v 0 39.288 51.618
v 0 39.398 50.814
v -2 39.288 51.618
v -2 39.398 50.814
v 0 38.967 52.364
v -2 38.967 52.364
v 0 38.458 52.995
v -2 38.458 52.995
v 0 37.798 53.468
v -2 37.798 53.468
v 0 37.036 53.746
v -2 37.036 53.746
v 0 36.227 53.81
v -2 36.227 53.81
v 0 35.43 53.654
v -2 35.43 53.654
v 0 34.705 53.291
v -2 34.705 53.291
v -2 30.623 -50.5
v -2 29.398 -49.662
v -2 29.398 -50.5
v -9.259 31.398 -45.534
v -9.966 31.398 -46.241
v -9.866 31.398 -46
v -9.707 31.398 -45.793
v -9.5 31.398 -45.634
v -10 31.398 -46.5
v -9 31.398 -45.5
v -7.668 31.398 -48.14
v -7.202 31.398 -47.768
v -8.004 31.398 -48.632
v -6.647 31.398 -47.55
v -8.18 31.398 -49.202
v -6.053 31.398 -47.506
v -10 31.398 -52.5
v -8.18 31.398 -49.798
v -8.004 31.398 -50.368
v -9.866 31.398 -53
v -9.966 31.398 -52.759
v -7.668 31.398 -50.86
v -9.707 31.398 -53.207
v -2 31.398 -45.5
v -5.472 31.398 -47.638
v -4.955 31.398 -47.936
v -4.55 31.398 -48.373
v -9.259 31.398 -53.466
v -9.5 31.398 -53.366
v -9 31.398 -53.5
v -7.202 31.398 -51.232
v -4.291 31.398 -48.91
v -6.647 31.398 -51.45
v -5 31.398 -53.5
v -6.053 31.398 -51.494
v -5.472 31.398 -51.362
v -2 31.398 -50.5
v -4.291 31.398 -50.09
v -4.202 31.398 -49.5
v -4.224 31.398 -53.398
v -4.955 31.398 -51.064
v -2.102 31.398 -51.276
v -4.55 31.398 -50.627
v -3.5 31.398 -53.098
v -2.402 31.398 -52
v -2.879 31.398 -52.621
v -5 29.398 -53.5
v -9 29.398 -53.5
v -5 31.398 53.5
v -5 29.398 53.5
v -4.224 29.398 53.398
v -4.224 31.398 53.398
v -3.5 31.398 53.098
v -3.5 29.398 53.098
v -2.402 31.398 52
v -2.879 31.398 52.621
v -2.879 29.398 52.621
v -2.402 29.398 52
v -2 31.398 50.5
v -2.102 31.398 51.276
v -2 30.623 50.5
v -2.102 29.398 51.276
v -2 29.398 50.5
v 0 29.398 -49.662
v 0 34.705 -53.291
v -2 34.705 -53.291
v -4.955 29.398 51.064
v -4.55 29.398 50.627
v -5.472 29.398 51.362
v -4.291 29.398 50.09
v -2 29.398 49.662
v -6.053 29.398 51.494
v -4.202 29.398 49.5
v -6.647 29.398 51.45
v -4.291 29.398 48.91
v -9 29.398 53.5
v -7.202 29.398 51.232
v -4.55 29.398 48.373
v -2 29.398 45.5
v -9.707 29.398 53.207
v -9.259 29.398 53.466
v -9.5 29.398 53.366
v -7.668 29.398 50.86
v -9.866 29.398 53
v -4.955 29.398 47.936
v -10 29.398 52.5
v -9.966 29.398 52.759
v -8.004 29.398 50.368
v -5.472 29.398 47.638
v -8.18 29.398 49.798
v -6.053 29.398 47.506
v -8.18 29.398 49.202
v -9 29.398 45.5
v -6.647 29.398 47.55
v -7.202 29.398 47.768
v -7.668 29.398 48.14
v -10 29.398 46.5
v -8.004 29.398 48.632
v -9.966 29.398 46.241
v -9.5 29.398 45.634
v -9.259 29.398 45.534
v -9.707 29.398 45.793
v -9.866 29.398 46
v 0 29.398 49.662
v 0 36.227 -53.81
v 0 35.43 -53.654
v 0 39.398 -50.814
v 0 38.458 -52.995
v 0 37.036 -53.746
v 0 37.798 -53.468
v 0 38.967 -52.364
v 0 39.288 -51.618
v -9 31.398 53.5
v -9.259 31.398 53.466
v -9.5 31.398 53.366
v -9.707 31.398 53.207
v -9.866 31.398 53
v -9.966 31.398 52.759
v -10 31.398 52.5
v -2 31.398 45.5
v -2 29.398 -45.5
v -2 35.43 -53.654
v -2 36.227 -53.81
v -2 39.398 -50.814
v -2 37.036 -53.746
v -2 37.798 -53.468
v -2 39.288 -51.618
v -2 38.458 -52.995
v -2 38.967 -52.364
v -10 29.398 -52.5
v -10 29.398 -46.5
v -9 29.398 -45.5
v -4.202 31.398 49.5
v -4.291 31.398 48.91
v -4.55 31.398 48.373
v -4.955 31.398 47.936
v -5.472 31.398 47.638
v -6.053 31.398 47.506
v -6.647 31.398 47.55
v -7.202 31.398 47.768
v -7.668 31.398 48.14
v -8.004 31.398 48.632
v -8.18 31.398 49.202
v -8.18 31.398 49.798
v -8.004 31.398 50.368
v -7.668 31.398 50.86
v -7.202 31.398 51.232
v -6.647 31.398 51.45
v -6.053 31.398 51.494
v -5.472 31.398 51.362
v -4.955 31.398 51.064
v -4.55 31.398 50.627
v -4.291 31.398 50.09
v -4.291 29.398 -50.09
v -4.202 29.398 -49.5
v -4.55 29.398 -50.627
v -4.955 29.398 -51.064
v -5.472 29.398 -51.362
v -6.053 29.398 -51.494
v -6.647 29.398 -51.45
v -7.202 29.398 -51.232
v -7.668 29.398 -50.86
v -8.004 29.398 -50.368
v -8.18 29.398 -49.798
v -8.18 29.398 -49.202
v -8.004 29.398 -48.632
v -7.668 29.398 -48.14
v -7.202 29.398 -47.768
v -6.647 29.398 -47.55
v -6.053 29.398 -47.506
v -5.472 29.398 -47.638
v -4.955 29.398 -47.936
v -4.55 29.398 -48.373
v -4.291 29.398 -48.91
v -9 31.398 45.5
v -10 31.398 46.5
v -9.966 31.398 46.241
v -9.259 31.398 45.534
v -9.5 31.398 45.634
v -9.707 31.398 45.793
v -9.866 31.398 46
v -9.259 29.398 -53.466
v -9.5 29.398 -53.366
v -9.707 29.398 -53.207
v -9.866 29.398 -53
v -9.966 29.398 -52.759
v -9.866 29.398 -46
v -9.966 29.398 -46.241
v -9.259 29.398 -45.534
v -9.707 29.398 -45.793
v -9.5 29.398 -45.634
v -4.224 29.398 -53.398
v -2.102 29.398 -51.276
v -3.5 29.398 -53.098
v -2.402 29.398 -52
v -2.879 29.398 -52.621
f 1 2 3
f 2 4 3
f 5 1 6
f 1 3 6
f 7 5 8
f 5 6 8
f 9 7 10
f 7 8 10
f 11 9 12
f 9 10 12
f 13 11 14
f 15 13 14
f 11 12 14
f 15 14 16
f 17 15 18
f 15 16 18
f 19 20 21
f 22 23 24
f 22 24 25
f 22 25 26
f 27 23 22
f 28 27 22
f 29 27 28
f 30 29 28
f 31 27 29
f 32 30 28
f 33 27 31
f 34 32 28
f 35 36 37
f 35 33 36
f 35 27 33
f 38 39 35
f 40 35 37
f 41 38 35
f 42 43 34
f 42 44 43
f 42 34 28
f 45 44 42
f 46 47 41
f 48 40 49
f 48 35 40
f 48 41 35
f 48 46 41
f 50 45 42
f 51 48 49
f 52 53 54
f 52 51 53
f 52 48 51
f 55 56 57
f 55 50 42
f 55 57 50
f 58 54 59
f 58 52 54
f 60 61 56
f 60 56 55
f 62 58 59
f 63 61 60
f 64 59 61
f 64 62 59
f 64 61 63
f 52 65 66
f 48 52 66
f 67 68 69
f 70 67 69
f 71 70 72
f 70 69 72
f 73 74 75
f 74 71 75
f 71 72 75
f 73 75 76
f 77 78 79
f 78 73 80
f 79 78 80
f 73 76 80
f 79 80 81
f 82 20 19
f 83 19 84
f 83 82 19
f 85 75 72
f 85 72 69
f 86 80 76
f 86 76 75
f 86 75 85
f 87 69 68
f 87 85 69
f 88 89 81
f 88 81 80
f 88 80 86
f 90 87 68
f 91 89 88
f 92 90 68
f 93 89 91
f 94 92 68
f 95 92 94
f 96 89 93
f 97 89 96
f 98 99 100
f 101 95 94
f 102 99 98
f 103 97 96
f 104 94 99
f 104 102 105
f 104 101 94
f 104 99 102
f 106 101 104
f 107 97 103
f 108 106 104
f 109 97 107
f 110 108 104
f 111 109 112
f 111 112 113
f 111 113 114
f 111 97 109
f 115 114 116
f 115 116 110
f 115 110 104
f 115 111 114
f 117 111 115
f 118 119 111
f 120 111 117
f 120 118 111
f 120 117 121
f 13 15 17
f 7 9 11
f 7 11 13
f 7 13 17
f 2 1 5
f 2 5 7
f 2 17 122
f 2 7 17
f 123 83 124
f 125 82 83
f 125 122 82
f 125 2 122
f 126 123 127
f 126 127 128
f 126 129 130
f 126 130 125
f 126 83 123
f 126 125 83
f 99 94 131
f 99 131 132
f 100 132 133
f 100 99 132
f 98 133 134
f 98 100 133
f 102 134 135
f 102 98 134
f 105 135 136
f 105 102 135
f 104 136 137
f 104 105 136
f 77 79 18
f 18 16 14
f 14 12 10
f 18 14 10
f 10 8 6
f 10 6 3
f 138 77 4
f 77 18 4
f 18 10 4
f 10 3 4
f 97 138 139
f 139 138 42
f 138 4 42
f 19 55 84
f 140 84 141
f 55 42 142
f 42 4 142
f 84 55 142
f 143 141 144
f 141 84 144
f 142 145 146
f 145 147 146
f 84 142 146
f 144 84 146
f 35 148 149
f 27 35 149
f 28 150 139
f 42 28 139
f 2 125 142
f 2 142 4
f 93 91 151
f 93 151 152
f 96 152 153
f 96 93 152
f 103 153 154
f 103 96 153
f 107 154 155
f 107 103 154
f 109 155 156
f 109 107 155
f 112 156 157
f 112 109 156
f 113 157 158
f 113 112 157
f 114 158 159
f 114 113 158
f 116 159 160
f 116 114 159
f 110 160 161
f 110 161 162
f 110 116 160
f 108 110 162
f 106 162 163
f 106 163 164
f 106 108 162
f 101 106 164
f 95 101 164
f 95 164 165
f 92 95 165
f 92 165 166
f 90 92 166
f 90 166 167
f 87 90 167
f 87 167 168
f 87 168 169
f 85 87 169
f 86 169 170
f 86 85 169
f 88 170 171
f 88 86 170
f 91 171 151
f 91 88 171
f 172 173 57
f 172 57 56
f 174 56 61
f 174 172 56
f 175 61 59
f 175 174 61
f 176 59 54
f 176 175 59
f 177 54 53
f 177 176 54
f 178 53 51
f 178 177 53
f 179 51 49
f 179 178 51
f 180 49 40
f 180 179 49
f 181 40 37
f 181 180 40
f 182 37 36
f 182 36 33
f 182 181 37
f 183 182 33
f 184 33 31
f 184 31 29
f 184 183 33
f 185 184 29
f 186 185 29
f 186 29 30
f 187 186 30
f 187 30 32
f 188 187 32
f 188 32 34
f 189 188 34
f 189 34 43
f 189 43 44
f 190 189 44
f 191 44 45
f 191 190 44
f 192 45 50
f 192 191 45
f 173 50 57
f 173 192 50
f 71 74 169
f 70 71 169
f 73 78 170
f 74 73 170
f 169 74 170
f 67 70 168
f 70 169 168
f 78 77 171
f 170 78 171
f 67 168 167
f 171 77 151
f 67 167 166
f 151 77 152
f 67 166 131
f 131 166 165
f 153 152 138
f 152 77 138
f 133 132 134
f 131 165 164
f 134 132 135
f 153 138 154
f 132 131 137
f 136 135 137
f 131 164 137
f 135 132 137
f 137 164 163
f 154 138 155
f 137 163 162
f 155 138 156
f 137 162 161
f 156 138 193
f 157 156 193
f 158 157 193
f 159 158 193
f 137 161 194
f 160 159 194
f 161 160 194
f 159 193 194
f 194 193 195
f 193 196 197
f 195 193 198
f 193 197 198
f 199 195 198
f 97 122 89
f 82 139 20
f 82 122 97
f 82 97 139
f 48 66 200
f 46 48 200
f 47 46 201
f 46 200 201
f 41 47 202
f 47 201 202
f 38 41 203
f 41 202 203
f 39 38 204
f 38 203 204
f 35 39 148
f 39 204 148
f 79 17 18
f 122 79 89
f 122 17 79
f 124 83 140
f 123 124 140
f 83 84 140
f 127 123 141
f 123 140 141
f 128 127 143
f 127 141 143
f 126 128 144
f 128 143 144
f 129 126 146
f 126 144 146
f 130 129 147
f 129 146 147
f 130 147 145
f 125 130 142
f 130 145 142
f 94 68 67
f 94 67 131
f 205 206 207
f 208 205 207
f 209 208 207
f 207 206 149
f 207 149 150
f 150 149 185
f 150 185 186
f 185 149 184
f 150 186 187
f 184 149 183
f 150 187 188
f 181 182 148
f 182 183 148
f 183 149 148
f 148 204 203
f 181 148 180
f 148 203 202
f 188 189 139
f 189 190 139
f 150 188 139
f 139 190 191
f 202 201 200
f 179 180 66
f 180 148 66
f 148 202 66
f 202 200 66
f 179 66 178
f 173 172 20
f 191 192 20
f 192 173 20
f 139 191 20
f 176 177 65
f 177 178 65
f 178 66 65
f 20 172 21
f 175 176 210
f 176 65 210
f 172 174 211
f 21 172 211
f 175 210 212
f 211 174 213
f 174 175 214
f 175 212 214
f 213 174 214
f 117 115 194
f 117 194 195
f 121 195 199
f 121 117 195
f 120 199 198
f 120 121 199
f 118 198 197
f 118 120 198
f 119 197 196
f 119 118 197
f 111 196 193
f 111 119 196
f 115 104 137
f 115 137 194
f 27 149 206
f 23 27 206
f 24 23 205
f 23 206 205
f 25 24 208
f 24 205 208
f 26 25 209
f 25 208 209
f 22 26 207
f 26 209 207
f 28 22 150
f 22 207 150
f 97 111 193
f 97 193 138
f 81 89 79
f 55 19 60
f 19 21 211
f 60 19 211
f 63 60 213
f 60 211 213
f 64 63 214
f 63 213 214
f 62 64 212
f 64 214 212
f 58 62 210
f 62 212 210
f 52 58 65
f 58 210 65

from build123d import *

# Parameters (mm, degrees)
BASE_FLANGE1_DEPTH               = 2
FILLET1_R                        = 3
BOSS_EXTRUDE1_START              = 29.3979
BOSS_EXTRUDE1_DEPTH              = 2
F_4_0_START                      = 29.397900258
F_4_0_4_DIAMETER_HOLE1_OUTLINE_R = 2
F_4_0_4_DIAMETER_HOLE1_DEPTH     = 2
FILLET2_R                        = 3


# Read off the part's stored shape, not the designer's step: Ø4.0 (4) Diameter Hole1
# Sheet-metal steps are written as plain solids
with BuildPart() as part:
    # Sketch1 → Base-Flange1 (new body)
    with BuildSketch(Plane(origin=(0, 0, 0), x_dir=(0, 0, -1), z_dir=(1, 0, 0))):
        Polygon((49.662255386, 29.397900258), (56.5, 39.397900258), (-56.5, 39.397900258), (-49.662255386, 29.397900258), align=None)
    extrude(amount=-BASE_FLANGE1_DEPTH)

    # Fillet1
    fillet1_edges = [part.edges().sort_by_distance(p)[0] for p in [
        (-1, 39.397900258, 56.5),
        (-1, 39.397900258, -56.5),
    ]]
    fillet(fillet1_edges, radius=FILLET1_R)

    # Sketch2 → Boss-Extrude1 (add)
    with BuildSketch(Plane(origin=(0, 0, 0), x_dir=(1, 0, 0), z_dir=(0, 1, 0)).offset(BOSS_EXTRUDE1_START)):
        with BuildLine():
            Line((-2, 53.5), (-9, 53.5))
            ThreePointArc((-9, 53.5), (-9.707106781, 53.207106781), (-10, 52.5))
            Line((-10, 52.5), (-10, 46.5))
            ThreePointArc((-10, 46.5), (-9.707106781, 45.792893219), (-9, 45.5))
            Line((-9, 45.5), (-2, 45.5))
            Line((-2, 45.5), (-2, 53.5))
        make_face()
        with BuildLine():
            Line((-10, -52.5), (-10, -46.5))
            ThreePointArc((-10, -46.5), (-9.707106781, -45.792893219), (-9, -45.5))
            Line((-9, -45.5), (-2, -45.5))
            Line((-2, -45.5), (-2, -53.5))
            Line((-2, -53.5), (-9, -53.5))
            ThreePointArc((-9, -53.5), (-9.707106781, -53.207106781), (-10, -52.5))
        make_face()
    extrude(amount=BOSS_EXTRUDE1_DEPTH)

    # Ø4.0 (4) Diameter Hole1 outline → Ø4.0 (4) Diameter Hole1 (cut)
    with BuildSketch(Plane(origin=(0, 0, 0), x_dir=(1, 0, 0), z_dir=(0, 1, 0)).offset(F_4_0_START)):
        with Locations((-6.20230671, -49.5)):
            Circle(F_4_0_4_DIAMETER_HOLE1_OUTLINE_R)
        with Locations((-6.20230671, 49.5)):
            Circle(F_4_0_4_DIAMETER_HOLE1_OUTLINE_R)
    extrude(amount=F_4_0_4_DIAMETER_HOLE1_DEPTH, mode=Mode.SUBTRACT)

    # Fillet2
    # the kernel refuses this fillet: 3 mm, written as the material it takes off along each edge
    with BuildSketch(Plane(origin=(-2, 21.8979, -53.5), x_dir=(0, 0, 1), z_dir=(0, 1, 0))) as fillet2_piece_1:
        with BuildLine():
            CenterArc((FILLET2_R, -FILLET2_R), FILLET2_R, 90, 90)
            Line((0, -FILLET2_R), (0, 0))
            Line((0, 0), (FILLET2_R, 0))
        make_face()
    extrude(amount=17, mode=Mode.SUBTRACT)
    with BuildSketch(Plane(origin=(-2, 21.8979, 53.5), x_dir=(0, 0, -1), z_dir=(0, 1, 0))) as fillet2_piece_2:
        with BuildLine():
            CenterArc((FILLET2_R, FILLET2_R), FILLET2_R, 180, 90)
            Line((0, FILLET2_R), (0, 0))
            Line((0, 0), (FILLET2_R, 0))
        make_face()
    extrude(amount=17, mode=Mode.SUBTRACT)


solid = part.part
